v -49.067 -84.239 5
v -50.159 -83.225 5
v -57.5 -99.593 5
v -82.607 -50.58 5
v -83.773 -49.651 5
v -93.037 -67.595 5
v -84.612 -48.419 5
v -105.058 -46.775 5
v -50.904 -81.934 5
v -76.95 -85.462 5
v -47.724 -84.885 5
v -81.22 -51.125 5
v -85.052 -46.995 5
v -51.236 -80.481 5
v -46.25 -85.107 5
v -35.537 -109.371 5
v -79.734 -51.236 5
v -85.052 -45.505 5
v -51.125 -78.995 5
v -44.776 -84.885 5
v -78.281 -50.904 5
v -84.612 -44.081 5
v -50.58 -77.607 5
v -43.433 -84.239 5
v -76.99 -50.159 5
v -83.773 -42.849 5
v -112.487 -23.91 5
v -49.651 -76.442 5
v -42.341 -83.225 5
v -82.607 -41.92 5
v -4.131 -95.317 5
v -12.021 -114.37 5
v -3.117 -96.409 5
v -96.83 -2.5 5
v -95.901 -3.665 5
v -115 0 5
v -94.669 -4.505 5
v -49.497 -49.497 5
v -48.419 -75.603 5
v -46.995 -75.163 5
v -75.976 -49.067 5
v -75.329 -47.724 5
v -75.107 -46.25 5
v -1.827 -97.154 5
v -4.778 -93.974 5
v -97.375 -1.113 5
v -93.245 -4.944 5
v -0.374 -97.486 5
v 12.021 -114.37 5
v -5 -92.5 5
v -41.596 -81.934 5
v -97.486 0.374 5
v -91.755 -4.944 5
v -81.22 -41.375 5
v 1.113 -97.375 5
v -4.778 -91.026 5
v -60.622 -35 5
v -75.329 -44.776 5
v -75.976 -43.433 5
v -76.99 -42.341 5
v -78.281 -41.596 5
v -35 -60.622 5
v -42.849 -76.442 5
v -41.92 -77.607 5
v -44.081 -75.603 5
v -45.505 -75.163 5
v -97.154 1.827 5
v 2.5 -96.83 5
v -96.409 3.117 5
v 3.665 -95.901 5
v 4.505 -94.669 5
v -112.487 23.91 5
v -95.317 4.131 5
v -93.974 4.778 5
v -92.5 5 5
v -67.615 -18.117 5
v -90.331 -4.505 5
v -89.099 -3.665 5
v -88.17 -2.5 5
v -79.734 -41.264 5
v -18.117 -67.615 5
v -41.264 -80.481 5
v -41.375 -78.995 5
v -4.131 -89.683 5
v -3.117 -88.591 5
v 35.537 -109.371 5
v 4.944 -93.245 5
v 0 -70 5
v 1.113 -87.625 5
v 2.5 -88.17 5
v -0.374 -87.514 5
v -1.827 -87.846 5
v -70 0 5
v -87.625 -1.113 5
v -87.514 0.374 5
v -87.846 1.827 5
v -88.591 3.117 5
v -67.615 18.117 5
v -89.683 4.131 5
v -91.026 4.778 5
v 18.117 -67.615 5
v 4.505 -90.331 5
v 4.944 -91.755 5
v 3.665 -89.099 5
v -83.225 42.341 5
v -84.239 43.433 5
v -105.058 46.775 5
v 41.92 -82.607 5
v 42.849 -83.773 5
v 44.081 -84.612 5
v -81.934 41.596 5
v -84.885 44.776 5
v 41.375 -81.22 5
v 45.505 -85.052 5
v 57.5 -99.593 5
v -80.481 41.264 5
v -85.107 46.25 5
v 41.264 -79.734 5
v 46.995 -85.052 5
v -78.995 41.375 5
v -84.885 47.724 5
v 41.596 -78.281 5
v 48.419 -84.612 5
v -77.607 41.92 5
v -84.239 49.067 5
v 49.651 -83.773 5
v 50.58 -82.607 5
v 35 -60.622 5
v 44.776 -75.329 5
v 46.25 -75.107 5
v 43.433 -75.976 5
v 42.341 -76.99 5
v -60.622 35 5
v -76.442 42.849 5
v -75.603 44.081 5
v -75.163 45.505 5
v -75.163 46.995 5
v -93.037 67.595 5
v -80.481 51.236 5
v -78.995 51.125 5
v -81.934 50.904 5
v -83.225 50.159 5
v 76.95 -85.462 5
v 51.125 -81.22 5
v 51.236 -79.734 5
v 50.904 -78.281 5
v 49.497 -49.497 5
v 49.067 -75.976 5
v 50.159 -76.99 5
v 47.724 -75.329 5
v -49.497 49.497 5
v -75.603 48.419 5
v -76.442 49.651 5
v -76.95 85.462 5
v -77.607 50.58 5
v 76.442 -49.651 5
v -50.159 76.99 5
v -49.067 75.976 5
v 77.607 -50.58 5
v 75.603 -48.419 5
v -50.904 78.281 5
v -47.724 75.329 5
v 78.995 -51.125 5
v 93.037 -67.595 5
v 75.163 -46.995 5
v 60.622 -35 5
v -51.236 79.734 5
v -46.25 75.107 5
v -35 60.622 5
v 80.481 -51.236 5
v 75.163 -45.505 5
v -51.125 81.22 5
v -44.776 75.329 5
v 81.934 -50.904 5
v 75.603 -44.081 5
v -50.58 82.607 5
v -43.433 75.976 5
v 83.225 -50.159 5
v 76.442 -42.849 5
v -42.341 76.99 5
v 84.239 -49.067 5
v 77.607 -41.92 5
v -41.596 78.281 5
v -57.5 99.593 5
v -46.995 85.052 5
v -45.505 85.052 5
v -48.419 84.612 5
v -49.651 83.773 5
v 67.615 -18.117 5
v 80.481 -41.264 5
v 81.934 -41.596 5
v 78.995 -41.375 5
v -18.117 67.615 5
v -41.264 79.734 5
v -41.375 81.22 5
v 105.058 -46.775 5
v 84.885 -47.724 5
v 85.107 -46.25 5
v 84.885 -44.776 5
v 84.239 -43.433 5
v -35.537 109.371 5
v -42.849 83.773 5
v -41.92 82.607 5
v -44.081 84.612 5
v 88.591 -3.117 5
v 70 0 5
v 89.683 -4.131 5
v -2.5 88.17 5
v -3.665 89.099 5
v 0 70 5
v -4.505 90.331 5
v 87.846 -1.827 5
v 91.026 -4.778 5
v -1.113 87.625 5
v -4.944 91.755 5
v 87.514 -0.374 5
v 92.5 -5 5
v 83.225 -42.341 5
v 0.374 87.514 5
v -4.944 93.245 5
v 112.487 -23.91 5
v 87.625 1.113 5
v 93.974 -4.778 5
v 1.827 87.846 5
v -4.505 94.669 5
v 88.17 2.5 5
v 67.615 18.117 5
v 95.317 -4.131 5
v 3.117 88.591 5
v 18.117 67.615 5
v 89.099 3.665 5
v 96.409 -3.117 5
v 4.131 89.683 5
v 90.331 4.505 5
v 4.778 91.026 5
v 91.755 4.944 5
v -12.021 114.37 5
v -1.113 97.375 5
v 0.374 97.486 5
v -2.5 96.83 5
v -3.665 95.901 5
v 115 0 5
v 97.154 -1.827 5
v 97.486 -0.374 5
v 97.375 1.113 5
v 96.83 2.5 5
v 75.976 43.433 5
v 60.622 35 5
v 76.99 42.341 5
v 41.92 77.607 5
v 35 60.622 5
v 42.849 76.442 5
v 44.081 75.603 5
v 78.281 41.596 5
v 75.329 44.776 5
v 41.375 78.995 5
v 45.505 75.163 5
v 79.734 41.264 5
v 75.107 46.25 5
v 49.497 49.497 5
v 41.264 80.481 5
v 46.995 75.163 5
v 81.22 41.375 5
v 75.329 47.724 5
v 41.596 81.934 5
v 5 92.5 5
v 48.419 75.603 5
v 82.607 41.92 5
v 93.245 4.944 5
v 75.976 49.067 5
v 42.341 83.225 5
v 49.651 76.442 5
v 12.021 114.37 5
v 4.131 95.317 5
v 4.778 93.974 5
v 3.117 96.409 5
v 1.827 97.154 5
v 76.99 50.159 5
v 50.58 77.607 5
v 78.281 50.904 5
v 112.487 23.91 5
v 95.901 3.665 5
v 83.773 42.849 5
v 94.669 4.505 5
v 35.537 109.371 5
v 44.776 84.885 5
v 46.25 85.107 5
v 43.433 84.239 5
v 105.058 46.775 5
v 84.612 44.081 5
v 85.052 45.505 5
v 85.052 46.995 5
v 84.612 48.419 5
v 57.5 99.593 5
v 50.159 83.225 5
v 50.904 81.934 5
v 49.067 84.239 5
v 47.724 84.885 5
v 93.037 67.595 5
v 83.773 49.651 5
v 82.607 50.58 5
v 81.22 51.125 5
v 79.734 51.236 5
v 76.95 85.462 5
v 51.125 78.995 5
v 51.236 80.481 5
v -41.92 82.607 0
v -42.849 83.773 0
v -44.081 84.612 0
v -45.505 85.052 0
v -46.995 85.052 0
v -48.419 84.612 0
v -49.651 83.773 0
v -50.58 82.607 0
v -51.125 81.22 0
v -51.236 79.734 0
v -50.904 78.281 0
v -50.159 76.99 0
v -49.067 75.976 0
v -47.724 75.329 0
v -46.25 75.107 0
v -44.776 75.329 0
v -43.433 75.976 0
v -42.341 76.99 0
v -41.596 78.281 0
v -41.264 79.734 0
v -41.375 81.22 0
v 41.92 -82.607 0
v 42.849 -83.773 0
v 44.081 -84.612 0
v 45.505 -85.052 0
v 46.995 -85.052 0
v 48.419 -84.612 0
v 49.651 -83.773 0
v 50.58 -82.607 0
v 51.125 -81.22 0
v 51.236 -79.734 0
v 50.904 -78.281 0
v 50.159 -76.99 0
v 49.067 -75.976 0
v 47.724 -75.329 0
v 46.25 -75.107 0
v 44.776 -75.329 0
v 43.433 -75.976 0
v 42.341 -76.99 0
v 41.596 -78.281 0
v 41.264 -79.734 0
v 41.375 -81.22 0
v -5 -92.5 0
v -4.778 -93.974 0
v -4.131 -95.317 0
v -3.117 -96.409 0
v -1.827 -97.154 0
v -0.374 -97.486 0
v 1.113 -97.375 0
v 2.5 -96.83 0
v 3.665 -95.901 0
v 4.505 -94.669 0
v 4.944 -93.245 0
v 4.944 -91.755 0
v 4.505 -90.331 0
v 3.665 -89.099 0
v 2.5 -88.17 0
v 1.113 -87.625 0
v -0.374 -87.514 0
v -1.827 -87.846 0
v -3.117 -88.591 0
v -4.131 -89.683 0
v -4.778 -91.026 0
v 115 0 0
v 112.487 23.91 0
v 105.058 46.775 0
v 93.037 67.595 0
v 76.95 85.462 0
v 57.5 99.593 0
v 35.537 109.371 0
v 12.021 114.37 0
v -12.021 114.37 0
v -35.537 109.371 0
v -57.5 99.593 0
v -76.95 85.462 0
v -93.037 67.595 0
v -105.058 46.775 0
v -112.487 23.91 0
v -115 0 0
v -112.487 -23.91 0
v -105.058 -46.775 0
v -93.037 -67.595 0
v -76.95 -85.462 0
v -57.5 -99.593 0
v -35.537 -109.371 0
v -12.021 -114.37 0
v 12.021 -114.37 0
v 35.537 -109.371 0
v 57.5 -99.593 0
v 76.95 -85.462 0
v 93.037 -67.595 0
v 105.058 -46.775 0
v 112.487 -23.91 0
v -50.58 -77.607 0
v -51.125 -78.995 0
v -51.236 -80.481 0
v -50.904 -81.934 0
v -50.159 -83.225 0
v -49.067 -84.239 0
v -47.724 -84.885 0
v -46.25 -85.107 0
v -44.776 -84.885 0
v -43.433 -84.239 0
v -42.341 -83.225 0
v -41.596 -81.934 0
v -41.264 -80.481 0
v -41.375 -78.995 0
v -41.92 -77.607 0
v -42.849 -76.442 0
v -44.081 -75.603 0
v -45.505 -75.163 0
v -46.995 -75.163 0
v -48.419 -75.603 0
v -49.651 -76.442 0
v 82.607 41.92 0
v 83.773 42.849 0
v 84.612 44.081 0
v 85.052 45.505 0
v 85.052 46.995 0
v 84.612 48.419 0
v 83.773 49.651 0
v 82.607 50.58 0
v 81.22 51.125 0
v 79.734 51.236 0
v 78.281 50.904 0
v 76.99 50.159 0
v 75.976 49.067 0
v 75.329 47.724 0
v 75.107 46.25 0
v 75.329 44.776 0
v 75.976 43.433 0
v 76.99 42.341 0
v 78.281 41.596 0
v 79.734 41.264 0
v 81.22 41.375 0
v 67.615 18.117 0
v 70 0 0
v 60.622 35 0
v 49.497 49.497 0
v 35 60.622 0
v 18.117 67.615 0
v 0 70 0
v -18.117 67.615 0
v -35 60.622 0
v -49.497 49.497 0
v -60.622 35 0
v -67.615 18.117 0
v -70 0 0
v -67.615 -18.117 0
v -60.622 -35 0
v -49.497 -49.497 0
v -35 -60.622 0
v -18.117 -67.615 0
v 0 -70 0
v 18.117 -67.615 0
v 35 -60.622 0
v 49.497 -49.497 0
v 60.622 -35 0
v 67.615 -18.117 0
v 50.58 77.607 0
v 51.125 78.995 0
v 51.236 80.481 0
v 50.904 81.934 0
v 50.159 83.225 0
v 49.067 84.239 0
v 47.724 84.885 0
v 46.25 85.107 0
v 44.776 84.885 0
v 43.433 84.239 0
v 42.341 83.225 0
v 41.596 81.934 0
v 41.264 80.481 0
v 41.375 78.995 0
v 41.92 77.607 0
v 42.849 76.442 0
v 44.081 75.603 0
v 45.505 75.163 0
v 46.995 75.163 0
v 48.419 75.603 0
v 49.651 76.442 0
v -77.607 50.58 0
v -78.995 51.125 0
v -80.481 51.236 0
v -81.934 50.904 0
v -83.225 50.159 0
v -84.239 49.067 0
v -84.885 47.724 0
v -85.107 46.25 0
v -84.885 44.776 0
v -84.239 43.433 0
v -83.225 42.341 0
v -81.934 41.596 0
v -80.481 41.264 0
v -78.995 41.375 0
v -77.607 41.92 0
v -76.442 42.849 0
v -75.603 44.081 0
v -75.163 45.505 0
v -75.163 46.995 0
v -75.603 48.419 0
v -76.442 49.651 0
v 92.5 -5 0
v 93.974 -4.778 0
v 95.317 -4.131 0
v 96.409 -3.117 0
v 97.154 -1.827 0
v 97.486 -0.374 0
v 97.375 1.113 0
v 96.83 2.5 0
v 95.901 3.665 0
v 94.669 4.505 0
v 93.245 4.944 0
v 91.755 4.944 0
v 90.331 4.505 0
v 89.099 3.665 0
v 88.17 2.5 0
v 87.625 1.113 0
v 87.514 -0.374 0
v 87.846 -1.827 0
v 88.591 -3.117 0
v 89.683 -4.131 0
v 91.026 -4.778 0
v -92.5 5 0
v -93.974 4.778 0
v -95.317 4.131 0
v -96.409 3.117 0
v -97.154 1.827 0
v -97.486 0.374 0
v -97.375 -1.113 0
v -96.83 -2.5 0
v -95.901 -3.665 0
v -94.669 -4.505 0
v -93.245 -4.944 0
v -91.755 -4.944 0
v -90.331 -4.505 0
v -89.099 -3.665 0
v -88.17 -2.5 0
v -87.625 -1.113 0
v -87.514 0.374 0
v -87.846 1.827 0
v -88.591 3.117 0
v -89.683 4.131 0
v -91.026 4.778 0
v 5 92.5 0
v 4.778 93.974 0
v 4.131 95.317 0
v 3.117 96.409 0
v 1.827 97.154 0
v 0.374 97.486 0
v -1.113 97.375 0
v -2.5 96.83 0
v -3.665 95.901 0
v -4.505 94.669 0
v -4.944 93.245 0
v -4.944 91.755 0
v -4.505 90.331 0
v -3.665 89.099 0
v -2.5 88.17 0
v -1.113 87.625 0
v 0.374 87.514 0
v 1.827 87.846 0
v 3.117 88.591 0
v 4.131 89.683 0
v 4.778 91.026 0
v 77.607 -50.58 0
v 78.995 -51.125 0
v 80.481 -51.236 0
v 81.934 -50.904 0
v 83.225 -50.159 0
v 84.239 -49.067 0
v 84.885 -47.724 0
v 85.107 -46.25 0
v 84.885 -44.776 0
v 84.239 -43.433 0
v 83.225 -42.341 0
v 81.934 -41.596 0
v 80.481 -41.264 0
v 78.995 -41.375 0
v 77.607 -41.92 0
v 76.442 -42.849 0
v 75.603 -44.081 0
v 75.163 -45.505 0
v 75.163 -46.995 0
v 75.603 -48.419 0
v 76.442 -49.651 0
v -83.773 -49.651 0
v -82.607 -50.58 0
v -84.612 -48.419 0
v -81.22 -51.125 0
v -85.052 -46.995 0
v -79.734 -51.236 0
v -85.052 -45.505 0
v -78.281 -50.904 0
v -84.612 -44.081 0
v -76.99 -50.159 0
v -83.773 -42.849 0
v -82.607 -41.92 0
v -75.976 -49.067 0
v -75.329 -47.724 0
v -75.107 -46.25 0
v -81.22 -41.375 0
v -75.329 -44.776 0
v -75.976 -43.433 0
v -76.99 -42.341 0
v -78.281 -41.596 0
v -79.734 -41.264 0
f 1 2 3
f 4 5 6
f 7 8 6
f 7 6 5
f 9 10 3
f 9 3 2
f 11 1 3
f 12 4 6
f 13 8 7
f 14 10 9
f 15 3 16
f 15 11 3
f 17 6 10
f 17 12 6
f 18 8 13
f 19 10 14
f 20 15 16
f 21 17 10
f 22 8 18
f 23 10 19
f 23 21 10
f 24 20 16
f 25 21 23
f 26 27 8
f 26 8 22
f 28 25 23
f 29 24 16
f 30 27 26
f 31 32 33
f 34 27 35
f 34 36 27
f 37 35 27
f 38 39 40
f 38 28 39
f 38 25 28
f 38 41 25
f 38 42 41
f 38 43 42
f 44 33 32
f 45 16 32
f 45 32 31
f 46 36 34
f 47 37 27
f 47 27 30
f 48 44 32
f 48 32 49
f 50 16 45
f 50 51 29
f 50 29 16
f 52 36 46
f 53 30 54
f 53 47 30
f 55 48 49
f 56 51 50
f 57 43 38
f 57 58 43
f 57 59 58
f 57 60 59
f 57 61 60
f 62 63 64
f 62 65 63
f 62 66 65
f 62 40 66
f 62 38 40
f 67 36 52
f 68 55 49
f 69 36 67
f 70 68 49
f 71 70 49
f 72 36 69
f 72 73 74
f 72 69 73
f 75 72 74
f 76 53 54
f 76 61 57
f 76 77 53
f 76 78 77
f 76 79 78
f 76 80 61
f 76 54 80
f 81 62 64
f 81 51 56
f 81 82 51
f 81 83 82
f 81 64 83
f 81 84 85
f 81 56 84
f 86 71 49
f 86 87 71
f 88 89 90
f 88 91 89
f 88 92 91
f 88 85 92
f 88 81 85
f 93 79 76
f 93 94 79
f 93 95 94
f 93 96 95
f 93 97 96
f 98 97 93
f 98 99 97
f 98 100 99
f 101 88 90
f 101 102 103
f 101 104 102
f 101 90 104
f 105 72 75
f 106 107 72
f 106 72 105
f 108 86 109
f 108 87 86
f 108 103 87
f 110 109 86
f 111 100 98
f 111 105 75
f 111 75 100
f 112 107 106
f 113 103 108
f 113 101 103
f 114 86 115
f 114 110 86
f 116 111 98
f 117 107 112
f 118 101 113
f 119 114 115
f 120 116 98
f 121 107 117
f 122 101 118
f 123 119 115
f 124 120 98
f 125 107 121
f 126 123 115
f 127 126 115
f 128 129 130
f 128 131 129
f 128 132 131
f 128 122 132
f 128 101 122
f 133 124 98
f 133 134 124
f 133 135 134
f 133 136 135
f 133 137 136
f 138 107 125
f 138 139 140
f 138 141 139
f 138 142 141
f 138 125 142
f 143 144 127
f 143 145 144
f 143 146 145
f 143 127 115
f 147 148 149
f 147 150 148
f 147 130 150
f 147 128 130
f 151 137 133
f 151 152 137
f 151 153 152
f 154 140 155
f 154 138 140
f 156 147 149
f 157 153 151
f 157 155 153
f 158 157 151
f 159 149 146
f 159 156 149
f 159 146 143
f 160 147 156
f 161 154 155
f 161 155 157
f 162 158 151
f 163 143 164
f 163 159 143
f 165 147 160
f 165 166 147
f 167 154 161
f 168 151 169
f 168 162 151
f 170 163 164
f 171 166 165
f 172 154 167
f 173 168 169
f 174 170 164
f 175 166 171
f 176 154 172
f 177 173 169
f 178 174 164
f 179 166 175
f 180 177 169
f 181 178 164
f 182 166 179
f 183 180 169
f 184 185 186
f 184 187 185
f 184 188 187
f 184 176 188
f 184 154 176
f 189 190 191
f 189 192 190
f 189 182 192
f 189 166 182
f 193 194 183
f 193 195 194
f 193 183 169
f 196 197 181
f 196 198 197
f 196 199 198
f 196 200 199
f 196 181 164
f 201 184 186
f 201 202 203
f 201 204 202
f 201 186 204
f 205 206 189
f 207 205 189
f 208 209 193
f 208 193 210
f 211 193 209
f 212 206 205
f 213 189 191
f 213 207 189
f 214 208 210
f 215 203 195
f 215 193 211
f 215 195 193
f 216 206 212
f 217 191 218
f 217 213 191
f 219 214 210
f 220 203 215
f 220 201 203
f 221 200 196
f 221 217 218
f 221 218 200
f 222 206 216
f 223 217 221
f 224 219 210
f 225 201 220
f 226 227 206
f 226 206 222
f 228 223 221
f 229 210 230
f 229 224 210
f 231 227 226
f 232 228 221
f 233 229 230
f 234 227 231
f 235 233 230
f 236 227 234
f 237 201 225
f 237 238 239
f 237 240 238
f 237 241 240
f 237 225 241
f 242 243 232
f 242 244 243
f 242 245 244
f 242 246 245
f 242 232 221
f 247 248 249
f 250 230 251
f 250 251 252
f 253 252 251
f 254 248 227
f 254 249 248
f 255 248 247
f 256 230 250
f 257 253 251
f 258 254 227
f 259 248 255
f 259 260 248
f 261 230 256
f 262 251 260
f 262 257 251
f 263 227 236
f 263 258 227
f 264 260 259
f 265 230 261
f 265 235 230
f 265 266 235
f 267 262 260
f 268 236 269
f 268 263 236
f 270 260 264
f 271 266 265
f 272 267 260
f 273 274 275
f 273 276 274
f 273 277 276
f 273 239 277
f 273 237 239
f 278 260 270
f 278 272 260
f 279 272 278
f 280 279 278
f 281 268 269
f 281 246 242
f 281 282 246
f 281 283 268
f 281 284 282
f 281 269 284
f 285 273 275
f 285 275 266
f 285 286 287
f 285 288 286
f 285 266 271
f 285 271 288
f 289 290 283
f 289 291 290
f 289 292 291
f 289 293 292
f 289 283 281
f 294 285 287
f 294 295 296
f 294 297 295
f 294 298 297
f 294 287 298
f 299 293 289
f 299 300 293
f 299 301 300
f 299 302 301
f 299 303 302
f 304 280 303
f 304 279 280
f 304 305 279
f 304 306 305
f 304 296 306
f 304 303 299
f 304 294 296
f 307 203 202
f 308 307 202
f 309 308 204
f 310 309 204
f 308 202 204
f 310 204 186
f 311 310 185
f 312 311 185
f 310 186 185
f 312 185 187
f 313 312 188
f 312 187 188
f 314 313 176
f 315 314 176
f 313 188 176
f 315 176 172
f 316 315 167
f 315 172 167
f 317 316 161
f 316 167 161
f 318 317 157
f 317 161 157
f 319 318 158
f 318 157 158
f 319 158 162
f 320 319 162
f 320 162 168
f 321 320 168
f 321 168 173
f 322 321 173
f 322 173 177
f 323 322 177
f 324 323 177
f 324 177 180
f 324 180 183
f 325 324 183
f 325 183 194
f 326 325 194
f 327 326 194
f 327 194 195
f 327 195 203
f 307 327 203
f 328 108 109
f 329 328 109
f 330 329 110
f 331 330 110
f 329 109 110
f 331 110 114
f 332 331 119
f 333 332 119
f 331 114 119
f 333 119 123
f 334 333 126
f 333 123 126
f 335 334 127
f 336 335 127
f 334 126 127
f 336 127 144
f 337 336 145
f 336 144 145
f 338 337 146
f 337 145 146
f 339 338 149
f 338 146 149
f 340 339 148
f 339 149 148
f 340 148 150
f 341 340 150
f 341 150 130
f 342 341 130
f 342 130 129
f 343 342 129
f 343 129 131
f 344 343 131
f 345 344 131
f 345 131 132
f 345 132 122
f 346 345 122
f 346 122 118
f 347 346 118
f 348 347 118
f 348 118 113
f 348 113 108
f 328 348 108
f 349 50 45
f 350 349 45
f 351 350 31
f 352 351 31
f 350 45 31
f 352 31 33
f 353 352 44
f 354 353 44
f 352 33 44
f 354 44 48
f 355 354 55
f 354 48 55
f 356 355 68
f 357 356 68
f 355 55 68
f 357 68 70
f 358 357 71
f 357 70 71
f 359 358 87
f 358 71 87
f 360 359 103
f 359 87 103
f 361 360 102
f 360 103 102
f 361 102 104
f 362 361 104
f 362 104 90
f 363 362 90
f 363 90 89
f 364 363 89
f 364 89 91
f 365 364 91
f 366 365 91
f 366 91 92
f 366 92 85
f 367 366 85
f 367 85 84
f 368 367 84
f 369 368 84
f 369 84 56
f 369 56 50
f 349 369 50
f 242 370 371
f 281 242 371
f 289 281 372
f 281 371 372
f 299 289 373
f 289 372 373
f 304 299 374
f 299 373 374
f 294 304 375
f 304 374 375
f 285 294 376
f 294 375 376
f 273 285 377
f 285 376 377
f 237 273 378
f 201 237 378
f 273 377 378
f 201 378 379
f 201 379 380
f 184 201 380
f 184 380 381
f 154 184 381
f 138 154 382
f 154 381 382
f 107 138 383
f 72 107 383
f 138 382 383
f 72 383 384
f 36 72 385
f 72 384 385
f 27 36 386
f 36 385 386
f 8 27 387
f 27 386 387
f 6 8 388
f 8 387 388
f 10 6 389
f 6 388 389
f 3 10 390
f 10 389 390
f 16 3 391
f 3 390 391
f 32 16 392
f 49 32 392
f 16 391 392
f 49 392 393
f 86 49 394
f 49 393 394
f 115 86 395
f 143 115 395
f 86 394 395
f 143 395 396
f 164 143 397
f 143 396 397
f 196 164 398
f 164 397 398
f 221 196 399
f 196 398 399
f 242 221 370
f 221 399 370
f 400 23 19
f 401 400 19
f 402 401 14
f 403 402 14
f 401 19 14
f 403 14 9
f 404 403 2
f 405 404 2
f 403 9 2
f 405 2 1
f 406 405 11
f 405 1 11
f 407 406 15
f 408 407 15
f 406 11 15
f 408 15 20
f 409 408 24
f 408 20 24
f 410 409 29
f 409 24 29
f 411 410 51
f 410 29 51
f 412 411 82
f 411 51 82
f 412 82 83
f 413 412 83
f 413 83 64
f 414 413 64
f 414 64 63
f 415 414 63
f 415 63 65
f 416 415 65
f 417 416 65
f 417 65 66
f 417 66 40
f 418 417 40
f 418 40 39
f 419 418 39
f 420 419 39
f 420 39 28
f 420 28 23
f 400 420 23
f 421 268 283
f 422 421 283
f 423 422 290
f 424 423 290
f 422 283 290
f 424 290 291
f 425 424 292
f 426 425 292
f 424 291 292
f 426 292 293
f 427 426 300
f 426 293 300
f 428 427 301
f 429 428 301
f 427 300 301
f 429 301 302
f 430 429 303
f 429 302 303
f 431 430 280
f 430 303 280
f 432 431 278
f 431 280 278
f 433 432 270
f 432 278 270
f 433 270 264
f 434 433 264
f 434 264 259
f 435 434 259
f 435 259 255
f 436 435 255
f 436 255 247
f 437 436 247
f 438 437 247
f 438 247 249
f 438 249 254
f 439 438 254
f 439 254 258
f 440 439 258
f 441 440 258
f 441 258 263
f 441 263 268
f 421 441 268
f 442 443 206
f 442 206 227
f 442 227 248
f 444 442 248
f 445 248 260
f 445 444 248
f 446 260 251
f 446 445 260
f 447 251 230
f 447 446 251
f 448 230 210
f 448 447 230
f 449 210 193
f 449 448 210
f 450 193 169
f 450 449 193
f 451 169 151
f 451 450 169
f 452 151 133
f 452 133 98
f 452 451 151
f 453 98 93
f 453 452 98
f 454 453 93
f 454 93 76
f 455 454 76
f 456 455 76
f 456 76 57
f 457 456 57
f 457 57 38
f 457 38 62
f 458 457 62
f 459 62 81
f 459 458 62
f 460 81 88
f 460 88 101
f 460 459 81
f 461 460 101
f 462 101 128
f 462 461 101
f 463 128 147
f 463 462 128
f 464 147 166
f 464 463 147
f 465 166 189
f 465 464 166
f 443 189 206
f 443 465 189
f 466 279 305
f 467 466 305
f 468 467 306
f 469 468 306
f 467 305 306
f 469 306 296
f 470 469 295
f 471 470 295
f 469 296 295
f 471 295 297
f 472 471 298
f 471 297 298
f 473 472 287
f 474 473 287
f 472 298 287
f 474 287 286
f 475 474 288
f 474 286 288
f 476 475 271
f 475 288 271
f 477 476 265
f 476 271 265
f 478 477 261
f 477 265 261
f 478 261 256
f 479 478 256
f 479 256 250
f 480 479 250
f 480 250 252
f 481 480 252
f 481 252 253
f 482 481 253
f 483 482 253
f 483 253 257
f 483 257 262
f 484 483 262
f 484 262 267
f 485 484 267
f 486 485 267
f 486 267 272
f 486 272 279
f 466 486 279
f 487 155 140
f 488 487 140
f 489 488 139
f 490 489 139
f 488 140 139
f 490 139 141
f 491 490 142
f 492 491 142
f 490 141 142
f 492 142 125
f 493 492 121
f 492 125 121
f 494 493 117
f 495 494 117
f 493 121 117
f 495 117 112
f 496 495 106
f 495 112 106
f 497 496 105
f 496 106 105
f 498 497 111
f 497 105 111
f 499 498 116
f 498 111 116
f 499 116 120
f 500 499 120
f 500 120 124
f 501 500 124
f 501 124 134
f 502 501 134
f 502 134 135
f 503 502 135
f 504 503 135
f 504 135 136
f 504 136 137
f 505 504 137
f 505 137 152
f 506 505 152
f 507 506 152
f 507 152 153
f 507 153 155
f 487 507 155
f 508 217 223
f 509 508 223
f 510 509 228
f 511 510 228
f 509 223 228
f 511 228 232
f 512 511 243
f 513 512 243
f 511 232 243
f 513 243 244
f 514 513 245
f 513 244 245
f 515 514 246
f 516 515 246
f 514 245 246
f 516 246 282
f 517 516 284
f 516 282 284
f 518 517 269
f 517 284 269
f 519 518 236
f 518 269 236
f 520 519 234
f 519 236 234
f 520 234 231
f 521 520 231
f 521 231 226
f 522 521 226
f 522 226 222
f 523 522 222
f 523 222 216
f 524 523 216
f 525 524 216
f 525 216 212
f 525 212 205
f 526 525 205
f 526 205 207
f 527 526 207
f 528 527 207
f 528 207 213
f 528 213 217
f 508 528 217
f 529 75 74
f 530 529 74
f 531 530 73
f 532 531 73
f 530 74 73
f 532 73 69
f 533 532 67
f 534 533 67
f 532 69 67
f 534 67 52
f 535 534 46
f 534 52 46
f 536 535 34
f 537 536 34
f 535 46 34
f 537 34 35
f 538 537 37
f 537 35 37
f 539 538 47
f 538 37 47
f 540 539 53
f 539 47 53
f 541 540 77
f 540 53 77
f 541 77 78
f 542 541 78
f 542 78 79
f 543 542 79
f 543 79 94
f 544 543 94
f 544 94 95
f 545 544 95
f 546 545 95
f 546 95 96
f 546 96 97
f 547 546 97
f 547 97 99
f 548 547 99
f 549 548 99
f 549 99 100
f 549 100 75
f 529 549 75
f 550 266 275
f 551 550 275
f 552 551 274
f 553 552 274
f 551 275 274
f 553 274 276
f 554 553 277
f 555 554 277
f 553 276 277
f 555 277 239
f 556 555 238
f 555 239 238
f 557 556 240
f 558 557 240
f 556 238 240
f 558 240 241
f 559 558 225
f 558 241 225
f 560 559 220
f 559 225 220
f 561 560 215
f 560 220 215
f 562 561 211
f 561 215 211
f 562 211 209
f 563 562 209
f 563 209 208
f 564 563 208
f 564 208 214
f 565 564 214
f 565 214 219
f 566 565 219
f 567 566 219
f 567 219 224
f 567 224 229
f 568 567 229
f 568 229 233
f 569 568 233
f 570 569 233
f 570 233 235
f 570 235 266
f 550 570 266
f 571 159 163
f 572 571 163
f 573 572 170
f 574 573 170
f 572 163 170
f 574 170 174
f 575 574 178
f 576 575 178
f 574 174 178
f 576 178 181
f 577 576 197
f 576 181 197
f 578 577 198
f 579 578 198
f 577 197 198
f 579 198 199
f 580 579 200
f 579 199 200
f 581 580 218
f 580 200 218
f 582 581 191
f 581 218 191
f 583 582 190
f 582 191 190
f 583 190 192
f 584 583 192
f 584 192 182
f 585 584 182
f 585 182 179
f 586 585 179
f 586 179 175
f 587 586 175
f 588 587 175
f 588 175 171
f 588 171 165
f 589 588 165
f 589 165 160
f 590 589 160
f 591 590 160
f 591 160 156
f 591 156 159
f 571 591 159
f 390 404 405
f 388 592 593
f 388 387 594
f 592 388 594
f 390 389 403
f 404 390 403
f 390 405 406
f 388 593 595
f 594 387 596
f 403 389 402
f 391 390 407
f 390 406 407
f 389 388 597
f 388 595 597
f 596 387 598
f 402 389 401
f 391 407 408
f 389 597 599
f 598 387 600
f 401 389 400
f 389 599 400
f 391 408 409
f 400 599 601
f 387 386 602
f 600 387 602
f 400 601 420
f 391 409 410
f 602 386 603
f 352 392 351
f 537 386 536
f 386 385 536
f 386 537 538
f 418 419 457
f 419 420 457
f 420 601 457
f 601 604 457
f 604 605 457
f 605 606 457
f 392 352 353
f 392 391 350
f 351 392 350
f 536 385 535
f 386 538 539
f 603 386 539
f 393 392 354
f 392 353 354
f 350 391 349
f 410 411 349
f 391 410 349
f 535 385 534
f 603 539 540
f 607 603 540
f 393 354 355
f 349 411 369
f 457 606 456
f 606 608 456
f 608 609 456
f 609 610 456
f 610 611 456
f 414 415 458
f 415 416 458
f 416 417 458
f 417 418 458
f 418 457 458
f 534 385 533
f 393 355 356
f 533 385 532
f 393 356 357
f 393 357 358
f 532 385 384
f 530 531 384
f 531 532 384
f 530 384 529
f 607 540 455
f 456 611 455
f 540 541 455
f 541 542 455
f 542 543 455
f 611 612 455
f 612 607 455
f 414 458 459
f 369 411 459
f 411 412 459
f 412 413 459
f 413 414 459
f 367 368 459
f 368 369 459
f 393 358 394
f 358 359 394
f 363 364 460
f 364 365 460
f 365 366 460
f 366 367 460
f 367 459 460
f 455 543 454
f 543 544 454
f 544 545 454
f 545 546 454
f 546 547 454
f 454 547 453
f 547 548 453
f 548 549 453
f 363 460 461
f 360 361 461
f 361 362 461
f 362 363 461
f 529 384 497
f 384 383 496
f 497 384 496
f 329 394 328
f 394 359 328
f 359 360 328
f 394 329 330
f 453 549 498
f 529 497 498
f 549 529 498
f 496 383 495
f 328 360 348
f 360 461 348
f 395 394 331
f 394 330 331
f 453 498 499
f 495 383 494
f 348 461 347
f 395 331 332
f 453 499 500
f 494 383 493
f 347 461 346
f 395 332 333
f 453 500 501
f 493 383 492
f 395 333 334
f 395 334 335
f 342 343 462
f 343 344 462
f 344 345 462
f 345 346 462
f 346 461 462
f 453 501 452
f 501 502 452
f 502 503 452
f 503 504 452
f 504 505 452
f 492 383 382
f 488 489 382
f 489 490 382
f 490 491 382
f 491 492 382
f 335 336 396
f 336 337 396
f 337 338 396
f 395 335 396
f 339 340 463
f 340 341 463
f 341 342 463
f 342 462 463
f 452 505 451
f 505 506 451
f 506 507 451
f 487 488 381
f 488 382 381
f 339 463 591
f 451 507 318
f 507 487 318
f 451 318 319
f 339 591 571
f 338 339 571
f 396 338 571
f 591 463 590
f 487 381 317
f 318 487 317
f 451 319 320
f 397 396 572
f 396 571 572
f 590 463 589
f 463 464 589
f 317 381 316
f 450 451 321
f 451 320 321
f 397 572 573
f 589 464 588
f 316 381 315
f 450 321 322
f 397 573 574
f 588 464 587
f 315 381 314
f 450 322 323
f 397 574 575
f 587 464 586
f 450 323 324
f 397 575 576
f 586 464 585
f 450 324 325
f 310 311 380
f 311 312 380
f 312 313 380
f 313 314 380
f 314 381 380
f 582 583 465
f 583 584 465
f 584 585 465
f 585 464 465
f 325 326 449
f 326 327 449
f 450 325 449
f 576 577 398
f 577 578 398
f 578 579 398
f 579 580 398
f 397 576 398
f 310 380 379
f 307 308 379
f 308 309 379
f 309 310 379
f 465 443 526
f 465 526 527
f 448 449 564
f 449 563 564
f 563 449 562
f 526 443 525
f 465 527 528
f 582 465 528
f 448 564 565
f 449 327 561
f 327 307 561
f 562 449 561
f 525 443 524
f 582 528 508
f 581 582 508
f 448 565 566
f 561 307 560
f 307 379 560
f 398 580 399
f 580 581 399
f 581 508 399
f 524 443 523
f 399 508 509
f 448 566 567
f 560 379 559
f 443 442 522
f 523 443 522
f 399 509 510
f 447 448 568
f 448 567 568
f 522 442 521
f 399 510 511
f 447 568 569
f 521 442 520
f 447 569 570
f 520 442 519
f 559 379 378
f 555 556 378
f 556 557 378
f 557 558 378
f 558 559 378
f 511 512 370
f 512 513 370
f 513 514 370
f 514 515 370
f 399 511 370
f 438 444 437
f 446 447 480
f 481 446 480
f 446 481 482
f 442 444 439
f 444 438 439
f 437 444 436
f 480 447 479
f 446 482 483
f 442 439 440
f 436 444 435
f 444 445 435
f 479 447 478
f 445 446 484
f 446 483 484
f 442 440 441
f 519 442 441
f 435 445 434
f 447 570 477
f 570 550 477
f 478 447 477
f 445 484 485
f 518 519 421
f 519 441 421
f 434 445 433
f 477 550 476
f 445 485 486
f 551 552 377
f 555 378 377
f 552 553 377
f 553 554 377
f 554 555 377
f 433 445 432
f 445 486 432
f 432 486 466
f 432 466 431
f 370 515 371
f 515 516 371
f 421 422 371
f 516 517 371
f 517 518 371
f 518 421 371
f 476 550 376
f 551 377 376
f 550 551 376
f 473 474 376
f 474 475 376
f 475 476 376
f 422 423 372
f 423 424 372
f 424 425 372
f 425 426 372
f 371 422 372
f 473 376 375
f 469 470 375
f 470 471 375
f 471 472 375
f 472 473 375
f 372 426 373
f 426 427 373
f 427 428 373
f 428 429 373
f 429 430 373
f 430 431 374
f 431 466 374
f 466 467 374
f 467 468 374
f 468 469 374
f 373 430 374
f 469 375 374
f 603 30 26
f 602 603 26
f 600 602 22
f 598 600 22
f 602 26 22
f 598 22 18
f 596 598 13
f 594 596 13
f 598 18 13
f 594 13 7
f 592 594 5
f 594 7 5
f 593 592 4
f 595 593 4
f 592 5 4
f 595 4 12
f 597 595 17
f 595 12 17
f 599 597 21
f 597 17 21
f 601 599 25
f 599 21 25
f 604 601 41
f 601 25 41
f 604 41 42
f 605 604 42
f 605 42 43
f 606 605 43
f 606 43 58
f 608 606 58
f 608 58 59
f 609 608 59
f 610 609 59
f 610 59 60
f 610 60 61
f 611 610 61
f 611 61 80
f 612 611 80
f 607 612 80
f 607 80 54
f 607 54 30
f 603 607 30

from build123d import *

# Parameters (mm, degrees)
F0_R            = 115
F0_R_2          = 70
F1_DEPTH        = 5
F2_R            = 5
F3_DEPTH        = 25
F3_COPIES_COUNT = 12


# Not quite as in the source:
# - a pattern or mirror of a feature is missing from the dataset's text; its kind, count and spacing are read off the source's solid


with BuildPart() as f1:
    # F0 (on Top) → F1 (new body)
    with BuildSketch(Plane.XY):
        Circle(F0_R)
        Circle(F0_R_2, mode=Mode.SUBTRACT)
    extrude(amount=F1_DEPTH)

    # F2 (on face) → F3 (cut)
    with BuildSketch(Plane.XY.offset(5)):
        with Locations((0, 92.5)):
            Circle(F2_R)
    f3 = extrude(amount=-F3_DEPTH, mode=Mode.SUBTRACT)

    # F3_copies: F3 ×12 about axis
    f3_copies_axis = Axis((0, 0, 0), (0, 0, 1))
    for i in range(1, F3_COPIES_COUNT):
        add(f3.rotate(f3_copies_axis, i * 360 / F3_COPIES_COUNT), mode=Mode.SUBTRACT)


solid = f1.part
